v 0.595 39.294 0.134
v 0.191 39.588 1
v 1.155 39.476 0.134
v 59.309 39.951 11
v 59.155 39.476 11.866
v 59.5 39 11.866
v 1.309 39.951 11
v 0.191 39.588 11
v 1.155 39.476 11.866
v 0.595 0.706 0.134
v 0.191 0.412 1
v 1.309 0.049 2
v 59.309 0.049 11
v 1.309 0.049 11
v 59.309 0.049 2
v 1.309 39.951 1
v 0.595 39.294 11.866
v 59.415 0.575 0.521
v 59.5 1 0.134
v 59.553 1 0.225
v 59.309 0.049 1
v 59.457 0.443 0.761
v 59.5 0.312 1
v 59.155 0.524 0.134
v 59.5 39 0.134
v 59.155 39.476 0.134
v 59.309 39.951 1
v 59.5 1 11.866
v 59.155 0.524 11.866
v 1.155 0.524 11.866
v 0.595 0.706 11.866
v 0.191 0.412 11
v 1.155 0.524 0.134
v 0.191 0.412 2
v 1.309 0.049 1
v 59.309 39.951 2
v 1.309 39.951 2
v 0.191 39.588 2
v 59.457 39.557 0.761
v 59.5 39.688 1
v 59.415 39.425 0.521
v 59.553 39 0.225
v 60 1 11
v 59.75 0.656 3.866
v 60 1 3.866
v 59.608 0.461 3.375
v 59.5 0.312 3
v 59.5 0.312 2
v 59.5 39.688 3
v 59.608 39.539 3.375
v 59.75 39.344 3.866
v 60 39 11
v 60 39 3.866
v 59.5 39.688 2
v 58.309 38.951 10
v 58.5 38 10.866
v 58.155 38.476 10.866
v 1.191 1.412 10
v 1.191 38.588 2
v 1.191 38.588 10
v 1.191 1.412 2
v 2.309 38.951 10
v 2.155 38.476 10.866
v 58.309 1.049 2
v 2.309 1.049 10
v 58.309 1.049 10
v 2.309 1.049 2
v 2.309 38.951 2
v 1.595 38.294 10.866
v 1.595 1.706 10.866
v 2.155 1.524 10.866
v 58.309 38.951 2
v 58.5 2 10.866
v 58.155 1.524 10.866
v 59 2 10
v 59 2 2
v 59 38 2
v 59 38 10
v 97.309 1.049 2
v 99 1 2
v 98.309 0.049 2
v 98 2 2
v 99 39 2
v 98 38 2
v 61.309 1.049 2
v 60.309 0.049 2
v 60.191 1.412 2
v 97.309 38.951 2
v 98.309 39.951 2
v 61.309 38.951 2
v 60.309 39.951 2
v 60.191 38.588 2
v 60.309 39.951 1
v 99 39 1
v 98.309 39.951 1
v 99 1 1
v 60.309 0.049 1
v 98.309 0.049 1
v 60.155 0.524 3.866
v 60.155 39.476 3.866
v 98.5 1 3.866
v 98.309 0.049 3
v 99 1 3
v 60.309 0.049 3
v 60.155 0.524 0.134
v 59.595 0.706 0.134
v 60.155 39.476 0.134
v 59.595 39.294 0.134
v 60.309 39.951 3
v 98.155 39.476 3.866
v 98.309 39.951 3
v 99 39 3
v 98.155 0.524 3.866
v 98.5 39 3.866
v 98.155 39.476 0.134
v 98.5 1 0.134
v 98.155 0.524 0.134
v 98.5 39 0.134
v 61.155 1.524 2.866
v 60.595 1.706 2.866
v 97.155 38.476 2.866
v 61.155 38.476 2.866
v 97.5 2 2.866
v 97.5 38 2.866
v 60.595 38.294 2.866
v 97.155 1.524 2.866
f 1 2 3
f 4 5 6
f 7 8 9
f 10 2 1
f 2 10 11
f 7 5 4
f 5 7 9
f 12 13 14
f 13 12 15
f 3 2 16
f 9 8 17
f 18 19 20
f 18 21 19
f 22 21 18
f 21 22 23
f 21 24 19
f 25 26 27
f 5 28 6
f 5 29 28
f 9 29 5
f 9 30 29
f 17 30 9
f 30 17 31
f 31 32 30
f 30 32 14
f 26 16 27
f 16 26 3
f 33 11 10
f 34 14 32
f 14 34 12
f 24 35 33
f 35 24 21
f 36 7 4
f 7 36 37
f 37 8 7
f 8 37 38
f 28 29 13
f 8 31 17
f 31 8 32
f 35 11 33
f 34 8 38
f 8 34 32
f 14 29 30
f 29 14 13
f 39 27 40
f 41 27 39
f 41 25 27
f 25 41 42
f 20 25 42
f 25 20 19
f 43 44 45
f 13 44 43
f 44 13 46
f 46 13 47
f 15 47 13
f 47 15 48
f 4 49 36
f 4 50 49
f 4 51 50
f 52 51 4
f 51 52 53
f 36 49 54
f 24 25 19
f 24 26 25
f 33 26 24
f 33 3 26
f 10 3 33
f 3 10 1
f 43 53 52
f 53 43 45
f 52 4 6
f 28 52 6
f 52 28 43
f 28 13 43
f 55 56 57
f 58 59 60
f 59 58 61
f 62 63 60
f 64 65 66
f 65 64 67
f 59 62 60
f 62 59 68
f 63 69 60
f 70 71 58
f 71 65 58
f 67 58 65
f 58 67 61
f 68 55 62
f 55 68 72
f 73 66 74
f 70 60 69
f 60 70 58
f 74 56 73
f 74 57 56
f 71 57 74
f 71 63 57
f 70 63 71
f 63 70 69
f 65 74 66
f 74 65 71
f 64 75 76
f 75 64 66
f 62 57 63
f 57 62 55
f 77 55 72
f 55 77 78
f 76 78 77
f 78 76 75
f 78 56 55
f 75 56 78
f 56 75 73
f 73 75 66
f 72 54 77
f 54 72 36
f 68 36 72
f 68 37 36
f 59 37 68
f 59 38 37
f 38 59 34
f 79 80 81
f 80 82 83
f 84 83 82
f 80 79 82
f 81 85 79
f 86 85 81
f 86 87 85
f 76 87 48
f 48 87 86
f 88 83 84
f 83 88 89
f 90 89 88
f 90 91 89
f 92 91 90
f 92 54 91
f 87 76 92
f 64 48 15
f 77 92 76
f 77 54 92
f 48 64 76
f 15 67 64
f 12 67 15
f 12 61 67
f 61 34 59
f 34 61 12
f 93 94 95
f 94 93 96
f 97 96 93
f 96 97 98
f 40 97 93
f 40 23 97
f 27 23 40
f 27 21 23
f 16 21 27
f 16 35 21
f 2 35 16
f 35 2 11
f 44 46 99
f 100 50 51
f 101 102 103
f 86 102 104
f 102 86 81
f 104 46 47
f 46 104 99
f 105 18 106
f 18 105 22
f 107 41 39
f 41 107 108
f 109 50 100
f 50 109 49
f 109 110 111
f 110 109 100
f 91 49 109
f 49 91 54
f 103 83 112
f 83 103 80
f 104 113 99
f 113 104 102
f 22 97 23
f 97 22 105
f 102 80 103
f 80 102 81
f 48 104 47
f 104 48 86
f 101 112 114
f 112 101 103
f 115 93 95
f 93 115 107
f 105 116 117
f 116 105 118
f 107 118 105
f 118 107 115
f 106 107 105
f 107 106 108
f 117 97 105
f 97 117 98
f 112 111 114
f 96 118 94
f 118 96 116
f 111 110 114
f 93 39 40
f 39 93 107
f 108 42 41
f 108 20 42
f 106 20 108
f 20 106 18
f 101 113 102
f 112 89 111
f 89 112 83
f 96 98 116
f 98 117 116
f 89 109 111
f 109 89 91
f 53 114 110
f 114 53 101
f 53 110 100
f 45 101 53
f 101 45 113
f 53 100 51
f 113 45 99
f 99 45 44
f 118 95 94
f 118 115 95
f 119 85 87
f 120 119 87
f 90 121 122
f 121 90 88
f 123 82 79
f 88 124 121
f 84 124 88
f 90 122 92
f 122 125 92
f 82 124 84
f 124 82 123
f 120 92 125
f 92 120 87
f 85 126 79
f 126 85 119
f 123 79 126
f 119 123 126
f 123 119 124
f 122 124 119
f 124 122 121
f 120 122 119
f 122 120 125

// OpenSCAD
module hollowBoxWithRoundedCorners(height, width, length, wall_thickness, corner_radius, x_offset=0, y_offset=0) {
    translate([x_offset, y_offset, 0])
    difference() {
        // Outer rounded box
        hull() {
            for (x = [0, length - corner_radius * 2])
                for (y = [0, width - corner_radius * 2])
                    for (z = [0, height - corner_radius * 2])
                        translate([x + corner_radius, y + corner_radius, z + corner_radius])
                            sphere(corner_radius);
        }

        // Inner cavity to make the box hollow
        translate([wall_thickness, wall_thickness, wall_thickness])
        hull() {
            for (x = [0, length - wall_thickness * 2 - corner_radius * 2])
                for (y = [0, width - wall_thickness * 2 - corner_radius * 2])
                    for (z = [0, height - wall_thickness * 2 - corner_radius * 2])
                        translate([x + corner_radius, y + corner_radius, z + corner_radius])
                            sphere(corner_radius);
        }

        // Removing the bottom
        translate([0, 0, 1])
        cube([length, width, wall_thickness]);
    }
}

module intersectionVolume(height1, width1, length1, x_offset1, y_offset1, height2, width2, length2, x_offset2, y_offset2) {
    intersection() {
        translate([x_offset1, y_offset1, 0])
        cube([length1, width1, height1]);

        translate([x_offset2, y_offset2, 0])
        cube([length2, width2, height2]);
    }
}

// Define the positions of the boxes
x_offset1 = 0;
y_offset1 = 0;
x_offset2 = 59;
y_offset2 = 0;

// First box without bottom
hollowBoxWithRoundedCorners(12, 40, 60, 1, 1, x_offset1, y_offset1);

// Second box without bottom
hollowBoxWithRoundedCorners(4, 40, 40, 1, 1, x_offset2, y_offset2);

// Remove the intersection
difference() {
    union() {
        hollowBoxWithRoundedCorners(12, 40, 60, 1, 1, x_offset1, y_offset1);
        hollowBoxWithRoundedCorners(4, 40, 40, 1, 1, x_offset2, y_offset2);
    }
    intersectionVolume(12, 40, 60, x_offset1, y_offset1, 4, 40, 40, x_offset2, y_offset2);
}
